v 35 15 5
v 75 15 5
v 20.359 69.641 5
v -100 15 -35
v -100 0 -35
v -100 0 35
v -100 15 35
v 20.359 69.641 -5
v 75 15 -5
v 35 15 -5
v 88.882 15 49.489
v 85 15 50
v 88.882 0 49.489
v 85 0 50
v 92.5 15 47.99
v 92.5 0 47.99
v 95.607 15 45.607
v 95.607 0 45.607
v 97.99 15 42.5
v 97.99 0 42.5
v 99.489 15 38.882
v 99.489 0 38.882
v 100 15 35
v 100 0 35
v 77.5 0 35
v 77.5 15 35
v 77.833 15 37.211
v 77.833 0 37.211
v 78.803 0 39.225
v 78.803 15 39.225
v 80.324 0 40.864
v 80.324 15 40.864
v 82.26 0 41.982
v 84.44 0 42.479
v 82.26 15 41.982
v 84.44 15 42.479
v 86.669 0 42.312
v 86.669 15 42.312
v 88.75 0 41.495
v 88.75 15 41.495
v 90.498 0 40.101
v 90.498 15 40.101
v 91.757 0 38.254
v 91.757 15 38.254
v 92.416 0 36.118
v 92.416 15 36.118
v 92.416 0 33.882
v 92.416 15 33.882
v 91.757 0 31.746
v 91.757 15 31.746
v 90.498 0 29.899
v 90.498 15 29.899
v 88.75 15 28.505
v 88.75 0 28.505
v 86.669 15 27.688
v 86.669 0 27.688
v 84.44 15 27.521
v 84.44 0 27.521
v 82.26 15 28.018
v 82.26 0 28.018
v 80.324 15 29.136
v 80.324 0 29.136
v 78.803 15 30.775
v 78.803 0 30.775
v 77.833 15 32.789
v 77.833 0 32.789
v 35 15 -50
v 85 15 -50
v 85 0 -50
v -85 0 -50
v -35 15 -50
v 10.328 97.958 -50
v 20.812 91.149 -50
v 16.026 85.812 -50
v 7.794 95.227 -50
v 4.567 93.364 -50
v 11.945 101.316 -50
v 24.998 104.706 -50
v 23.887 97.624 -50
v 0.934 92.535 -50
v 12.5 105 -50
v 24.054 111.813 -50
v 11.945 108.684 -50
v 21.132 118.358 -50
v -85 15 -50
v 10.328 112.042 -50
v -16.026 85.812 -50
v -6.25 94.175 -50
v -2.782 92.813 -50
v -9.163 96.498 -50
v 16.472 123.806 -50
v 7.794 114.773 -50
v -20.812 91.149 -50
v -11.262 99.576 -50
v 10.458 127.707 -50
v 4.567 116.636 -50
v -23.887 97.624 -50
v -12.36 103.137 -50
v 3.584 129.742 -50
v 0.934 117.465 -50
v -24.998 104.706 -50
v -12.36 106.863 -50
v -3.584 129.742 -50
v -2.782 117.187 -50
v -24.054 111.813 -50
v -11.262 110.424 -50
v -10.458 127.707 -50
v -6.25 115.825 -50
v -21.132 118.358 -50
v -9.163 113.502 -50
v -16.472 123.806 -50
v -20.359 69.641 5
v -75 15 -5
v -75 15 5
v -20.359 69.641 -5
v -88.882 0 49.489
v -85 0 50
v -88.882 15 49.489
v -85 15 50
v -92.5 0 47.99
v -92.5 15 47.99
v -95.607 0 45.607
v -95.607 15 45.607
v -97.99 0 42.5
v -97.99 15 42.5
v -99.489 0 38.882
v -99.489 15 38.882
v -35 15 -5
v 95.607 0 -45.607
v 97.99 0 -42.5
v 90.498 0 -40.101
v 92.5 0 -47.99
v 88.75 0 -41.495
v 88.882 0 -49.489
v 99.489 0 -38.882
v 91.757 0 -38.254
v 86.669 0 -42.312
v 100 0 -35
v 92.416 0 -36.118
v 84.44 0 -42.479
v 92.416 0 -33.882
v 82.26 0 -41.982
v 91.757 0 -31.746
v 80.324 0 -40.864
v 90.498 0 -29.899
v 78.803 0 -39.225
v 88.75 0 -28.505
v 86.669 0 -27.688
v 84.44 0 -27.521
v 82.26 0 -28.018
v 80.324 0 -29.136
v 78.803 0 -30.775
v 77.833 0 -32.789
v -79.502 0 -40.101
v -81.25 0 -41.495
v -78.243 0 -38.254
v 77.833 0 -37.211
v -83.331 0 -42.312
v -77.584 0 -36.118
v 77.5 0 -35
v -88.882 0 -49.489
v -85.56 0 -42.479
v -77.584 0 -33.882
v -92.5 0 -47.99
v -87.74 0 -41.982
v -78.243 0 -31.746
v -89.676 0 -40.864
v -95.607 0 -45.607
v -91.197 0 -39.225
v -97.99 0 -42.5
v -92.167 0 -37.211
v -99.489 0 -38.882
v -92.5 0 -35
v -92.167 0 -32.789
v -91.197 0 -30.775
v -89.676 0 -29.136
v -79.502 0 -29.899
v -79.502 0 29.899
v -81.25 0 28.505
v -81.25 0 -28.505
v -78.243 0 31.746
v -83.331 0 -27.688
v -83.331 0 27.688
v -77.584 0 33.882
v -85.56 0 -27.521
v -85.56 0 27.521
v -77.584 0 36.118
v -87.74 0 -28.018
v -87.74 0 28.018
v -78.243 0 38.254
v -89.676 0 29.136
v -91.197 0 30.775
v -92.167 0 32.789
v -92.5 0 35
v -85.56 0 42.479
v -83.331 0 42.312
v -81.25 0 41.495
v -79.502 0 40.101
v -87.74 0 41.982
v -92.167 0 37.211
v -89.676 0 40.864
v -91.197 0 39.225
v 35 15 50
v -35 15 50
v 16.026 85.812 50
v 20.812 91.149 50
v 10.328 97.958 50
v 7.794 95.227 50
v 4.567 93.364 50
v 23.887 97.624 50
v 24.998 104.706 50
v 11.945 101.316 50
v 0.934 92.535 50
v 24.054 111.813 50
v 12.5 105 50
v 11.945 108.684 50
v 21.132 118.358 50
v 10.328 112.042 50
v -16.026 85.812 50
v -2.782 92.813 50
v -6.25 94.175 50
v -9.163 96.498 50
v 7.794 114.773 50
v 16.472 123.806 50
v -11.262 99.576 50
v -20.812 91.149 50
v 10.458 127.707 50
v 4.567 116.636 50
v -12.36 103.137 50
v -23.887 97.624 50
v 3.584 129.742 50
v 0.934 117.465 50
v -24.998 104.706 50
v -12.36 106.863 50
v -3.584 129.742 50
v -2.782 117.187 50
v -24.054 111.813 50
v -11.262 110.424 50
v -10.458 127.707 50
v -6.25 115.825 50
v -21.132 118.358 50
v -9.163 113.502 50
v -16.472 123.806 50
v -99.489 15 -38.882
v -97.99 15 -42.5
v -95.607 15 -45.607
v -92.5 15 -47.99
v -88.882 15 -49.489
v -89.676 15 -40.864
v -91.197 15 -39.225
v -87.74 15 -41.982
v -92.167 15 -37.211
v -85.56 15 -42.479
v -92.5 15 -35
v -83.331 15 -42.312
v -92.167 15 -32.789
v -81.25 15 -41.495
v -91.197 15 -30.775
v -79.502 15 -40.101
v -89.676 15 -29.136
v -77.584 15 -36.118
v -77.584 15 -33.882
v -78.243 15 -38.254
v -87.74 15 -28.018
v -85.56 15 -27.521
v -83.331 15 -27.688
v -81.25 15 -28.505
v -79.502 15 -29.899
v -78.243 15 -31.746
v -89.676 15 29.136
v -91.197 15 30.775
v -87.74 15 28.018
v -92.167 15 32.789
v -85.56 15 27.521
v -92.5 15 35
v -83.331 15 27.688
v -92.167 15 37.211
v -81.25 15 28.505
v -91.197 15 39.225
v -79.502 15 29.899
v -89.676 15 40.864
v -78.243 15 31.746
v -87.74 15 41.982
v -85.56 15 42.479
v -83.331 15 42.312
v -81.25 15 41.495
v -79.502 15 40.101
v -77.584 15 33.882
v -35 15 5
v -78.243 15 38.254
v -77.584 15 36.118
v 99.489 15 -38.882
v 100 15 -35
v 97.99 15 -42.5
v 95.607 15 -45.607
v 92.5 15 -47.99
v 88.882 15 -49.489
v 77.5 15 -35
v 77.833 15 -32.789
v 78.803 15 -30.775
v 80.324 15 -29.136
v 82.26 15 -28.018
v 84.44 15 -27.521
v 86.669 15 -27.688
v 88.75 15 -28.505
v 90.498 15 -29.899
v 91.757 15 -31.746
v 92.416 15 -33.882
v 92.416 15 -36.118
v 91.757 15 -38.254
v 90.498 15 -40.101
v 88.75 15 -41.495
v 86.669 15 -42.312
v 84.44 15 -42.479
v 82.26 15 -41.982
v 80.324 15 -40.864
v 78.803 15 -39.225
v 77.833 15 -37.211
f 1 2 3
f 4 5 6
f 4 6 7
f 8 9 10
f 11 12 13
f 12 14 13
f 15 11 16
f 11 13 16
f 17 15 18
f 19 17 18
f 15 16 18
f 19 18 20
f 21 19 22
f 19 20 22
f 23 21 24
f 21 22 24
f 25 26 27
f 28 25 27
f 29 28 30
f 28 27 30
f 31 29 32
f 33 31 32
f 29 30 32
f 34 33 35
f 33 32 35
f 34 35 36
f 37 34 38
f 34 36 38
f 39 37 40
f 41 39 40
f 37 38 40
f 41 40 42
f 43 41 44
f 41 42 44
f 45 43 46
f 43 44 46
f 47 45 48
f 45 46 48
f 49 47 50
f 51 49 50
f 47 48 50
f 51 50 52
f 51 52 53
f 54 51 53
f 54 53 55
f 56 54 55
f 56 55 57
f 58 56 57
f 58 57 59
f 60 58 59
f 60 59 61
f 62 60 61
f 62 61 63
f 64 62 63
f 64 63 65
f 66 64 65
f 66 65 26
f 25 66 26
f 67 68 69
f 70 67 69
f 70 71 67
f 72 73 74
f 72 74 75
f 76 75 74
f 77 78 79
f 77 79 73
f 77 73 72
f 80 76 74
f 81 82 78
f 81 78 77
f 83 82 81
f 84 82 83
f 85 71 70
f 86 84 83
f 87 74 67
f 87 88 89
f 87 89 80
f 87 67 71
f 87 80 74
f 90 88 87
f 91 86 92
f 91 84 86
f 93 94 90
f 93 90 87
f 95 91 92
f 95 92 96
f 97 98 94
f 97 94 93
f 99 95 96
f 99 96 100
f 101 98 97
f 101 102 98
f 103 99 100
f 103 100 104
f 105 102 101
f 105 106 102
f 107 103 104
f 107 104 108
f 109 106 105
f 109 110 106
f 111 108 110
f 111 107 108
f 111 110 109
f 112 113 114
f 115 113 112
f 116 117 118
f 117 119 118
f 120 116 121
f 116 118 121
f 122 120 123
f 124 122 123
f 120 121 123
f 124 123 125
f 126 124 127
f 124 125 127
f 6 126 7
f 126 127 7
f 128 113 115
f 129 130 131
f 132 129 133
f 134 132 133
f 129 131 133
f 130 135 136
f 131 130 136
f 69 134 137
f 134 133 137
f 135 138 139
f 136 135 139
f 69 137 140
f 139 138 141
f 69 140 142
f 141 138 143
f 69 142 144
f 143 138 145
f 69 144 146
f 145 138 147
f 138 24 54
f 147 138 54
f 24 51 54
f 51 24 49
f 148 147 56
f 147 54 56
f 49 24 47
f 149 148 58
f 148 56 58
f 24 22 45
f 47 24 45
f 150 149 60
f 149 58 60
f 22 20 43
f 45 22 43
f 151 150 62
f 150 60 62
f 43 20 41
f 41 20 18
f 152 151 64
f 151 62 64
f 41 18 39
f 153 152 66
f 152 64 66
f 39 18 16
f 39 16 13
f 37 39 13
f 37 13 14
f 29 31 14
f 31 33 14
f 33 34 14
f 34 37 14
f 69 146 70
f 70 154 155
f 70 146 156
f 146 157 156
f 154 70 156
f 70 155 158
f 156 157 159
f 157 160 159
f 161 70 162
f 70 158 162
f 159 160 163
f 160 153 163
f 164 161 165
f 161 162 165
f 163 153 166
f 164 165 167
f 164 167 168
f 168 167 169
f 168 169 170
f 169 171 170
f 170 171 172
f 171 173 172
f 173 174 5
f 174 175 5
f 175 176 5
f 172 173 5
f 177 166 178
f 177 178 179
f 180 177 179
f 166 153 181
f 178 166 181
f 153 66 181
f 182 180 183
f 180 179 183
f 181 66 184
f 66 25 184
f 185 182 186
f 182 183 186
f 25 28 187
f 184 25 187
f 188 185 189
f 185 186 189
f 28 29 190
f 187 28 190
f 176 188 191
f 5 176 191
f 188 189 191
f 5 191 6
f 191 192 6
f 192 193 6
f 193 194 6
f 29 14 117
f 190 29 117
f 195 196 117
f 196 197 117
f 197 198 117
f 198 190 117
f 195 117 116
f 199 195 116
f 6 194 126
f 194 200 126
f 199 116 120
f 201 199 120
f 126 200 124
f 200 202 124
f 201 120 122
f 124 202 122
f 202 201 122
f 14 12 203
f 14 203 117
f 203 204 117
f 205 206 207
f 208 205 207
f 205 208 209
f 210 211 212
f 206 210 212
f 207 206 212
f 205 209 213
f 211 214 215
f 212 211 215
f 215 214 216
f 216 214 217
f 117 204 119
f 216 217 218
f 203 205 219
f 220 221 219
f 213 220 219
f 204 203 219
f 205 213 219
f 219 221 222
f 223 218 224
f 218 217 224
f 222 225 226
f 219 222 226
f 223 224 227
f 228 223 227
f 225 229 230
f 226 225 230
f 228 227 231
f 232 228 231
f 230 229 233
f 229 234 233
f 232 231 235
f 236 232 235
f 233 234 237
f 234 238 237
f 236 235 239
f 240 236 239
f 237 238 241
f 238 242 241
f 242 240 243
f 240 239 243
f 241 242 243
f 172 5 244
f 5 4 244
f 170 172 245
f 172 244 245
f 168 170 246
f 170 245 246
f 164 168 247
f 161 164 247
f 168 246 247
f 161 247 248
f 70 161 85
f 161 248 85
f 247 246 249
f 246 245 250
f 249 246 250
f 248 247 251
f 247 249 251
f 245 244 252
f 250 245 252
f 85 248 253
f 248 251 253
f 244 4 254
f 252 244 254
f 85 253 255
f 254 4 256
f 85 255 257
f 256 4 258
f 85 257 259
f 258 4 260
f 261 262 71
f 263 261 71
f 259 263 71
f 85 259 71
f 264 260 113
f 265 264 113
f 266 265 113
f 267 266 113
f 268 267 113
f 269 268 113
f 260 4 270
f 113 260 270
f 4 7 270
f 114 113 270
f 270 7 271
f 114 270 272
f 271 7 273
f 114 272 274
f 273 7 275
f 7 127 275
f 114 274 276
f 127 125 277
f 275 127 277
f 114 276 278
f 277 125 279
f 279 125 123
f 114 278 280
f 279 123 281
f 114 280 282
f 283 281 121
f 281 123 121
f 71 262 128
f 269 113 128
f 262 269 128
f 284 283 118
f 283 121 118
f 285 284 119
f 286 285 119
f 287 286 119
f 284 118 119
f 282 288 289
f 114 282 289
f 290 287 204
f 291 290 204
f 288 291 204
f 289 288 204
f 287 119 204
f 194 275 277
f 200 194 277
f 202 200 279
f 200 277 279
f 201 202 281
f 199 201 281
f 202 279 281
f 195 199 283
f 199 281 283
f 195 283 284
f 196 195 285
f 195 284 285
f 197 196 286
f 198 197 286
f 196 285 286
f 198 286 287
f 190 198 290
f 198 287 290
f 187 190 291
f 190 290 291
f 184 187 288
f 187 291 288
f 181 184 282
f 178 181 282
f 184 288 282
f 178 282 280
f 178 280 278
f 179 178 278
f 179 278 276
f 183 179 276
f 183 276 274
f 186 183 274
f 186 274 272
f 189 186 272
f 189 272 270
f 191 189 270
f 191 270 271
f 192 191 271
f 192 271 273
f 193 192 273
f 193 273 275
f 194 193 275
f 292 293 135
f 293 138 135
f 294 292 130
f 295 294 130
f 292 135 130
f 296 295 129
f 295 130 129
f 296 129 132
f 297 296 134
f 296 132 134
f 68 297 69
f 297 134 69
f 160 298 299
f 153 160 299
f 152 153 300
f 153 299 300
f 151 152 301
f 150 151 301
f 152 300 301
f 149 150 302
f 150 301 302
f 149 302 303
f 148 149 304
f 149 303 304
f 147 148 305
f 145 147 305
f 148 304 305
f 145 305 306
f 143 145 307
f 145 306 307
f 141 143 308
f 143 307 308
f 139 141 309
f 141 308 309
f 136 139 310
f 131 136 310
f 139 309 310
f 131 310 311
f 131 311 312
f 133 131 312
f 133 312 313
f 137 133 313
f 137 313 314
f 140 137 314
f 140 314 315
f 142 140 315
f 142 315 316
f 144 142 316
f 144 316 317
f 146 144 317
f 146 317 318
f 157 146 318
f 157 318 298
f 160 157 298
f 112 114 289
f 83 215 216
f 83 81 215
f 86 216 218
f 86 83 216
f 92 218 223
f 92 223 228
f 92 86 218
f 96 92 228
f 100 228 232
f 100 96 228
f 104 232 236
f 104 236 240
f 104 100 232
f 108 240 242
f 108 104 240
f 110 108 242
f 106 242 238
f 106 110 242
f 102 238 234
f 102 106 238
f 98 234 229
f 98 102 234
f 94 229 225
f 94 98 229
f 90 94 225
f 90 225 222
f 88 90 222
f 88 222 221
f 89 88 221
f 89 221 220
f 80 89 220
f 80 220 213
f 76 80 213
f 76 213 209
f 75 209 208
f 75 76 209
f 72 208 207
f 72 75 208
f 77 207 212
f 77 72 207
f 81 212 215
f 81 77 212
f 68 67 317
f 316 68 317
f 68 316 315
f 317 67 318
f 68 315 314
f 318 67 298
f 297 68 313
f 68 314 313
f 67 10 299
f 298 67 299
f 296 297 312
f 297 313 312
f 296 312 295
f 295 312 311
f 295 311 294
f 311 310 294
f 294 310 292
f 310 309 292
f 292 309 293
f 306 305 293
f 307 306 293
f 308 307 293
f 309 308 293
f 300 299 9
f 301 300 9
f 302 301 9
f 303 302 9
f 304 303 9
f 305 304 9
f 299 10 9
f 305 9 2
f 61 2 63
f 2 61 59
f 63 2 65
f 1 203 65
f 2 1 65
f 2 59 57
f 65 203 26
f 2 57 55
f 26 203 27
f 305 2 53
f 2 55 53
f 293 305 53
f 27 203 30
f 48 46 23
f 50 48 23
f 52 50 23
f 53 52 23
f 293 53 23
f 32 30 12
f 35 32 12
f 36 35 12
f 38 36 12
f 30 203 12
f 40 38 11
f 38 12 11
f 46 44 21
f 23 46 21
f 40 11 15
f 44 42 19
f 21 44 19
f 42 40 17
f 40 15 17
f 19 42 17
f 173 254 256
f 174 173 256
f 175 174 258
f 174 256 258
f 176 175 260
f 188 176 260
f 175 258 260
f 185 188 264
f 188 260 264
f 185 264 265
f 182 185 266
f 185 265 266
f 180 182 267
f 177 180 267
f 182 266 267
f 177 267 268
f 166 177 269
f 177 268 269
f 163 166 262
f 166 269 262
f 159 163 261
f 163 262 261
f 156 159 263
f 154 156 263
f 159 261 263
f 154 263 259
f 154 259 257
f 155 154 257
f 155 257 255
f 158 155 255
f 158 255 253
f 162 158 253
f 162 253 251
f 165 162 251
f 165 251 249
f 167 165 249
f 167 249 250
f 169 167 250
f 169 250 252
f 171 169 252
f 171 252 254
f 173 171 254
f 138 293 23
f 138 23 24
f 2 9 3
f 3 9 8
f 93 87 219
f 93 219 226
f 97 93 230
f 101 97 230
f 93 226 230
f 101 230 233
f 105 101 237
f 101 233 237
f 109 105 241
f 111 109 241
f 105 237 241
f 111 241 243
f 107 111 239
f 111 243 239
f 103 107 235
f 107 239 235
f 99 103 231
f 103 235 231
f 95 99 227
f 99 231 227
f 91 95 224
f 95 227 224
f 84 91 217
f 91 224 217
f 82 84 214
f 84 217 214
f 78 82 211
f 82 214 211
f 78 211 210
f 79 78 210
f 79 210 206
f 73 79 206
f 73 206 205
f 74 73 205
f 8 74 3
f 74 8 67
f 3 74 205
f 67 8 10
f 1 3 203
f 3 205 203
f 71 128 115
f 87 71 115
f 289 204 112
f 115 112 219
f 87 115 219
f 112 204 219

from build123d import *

# Parameters (mm, degrees)
SKETCH1_R           = 12.5
BOSS_EXTRUDE1_DEPTH = 50
FILLET1_R           = 15
SKETCH2_R           = 7.5
CUT_EXTRUDE1_DEPTH  = 161.390149323
RIB1_REACH          = 173.464
SKETCH3_WALL_W      = 422.202630092
SKETCH3_WALL_H      = 10


with BuildPart() as part:
    # Sketch1 → Boss-Extrude1 (new, symmetric)
    with BuildSketch(Plane.XY):
        with BuildLine():
            Line((-35, 15), (-16.025916537, 85.81224351))
            ThreePointArc((-16.025916537, 85.81224351), (0, 130), (16.025916537, 85.81224351))
            Line((16.025916537, 85.81224351), (35, 15))
            Line((35, 15), (100, 15))
            Line((100, 15), (100, 0))
            Line((100, 0), (-100, 0))
            Line((-100, 0), (-100, 15))
            Line((-100, 15), (-35, 15))
        make_face()
        with Locations((0, 105)):
            Circle(SKETCH1_R, mode=Mode.SUBTRACT)
    extrude(amount=BOSS_EXTRUDE1_DEPTH, both=True)

    # Fillet1
    fillet1_edges = [part.edges().sort_by_distance(p)[0] for p in [
        (100, 7.5, -50),
        (-100, 7.5, -50),
        (100, 7.5, 50),
        (-100, 7.5, 50),
    ]]
    fillet(fillet1_edges, radius=FILLET1_R)

    # Sketch2 → Cut-Extrude1 (cut, through all)
    with BuildSketch(Plane(origin=(0, 15, 0), x_dir=(1, 0, 0), z_dir=(0, 1, 0))):
        with Locations(Location((-85, 35, 0), (0, 0, 180))):
            Circle(SKETCH2_R)
        with Locations(Location((-85, -35, 0), (0, 0, 180))):
            Circle(SKETCH2_R)
        with Locations(Location((85, 35, 0), (0, 0, 180))):
            Circle(SKETCH2_R)
        with Locations(Location((85, -35, 0), (0, 0, 180))):
            Circle(SKETCH2_R)
    extrude(amount=-CUT_EXTRUDE1_DEPTH, mode=Mode.SUBTRACT)

    # Sketch3 wall → Rib1 (add, up to next)
    with BuildSketch(Plane(origin=(47.679491924, 42.320508076, 0), x_dir=(-0.707106781187, 0.707106781187, 0), z_dir=(-0.707106781187, -0.707106781187, 0)), mode=Mode.PRIVATE) as rib1_sk1:
        Rectangle(SKETCH3_WALL_W, SKETCH3_WALL_H)
    rib1_tool1 = extrude(rib1_sk1.sketch, amount=RIB1_REACH, mode=Mode.PRIVATE) - part.part
    rib1 = rib1_tool1.solids().sort_by_distance((47.679491924, 42.320508076, 0))[0]
    add(rib1)

    # Mirror1: Rib1 across plane
    add(rib1.mirror(Plane(origin=(0, 0, 0), x_dir=(0, 0, 1), z_dir=(1, 0, 0))))


solid = part.part
